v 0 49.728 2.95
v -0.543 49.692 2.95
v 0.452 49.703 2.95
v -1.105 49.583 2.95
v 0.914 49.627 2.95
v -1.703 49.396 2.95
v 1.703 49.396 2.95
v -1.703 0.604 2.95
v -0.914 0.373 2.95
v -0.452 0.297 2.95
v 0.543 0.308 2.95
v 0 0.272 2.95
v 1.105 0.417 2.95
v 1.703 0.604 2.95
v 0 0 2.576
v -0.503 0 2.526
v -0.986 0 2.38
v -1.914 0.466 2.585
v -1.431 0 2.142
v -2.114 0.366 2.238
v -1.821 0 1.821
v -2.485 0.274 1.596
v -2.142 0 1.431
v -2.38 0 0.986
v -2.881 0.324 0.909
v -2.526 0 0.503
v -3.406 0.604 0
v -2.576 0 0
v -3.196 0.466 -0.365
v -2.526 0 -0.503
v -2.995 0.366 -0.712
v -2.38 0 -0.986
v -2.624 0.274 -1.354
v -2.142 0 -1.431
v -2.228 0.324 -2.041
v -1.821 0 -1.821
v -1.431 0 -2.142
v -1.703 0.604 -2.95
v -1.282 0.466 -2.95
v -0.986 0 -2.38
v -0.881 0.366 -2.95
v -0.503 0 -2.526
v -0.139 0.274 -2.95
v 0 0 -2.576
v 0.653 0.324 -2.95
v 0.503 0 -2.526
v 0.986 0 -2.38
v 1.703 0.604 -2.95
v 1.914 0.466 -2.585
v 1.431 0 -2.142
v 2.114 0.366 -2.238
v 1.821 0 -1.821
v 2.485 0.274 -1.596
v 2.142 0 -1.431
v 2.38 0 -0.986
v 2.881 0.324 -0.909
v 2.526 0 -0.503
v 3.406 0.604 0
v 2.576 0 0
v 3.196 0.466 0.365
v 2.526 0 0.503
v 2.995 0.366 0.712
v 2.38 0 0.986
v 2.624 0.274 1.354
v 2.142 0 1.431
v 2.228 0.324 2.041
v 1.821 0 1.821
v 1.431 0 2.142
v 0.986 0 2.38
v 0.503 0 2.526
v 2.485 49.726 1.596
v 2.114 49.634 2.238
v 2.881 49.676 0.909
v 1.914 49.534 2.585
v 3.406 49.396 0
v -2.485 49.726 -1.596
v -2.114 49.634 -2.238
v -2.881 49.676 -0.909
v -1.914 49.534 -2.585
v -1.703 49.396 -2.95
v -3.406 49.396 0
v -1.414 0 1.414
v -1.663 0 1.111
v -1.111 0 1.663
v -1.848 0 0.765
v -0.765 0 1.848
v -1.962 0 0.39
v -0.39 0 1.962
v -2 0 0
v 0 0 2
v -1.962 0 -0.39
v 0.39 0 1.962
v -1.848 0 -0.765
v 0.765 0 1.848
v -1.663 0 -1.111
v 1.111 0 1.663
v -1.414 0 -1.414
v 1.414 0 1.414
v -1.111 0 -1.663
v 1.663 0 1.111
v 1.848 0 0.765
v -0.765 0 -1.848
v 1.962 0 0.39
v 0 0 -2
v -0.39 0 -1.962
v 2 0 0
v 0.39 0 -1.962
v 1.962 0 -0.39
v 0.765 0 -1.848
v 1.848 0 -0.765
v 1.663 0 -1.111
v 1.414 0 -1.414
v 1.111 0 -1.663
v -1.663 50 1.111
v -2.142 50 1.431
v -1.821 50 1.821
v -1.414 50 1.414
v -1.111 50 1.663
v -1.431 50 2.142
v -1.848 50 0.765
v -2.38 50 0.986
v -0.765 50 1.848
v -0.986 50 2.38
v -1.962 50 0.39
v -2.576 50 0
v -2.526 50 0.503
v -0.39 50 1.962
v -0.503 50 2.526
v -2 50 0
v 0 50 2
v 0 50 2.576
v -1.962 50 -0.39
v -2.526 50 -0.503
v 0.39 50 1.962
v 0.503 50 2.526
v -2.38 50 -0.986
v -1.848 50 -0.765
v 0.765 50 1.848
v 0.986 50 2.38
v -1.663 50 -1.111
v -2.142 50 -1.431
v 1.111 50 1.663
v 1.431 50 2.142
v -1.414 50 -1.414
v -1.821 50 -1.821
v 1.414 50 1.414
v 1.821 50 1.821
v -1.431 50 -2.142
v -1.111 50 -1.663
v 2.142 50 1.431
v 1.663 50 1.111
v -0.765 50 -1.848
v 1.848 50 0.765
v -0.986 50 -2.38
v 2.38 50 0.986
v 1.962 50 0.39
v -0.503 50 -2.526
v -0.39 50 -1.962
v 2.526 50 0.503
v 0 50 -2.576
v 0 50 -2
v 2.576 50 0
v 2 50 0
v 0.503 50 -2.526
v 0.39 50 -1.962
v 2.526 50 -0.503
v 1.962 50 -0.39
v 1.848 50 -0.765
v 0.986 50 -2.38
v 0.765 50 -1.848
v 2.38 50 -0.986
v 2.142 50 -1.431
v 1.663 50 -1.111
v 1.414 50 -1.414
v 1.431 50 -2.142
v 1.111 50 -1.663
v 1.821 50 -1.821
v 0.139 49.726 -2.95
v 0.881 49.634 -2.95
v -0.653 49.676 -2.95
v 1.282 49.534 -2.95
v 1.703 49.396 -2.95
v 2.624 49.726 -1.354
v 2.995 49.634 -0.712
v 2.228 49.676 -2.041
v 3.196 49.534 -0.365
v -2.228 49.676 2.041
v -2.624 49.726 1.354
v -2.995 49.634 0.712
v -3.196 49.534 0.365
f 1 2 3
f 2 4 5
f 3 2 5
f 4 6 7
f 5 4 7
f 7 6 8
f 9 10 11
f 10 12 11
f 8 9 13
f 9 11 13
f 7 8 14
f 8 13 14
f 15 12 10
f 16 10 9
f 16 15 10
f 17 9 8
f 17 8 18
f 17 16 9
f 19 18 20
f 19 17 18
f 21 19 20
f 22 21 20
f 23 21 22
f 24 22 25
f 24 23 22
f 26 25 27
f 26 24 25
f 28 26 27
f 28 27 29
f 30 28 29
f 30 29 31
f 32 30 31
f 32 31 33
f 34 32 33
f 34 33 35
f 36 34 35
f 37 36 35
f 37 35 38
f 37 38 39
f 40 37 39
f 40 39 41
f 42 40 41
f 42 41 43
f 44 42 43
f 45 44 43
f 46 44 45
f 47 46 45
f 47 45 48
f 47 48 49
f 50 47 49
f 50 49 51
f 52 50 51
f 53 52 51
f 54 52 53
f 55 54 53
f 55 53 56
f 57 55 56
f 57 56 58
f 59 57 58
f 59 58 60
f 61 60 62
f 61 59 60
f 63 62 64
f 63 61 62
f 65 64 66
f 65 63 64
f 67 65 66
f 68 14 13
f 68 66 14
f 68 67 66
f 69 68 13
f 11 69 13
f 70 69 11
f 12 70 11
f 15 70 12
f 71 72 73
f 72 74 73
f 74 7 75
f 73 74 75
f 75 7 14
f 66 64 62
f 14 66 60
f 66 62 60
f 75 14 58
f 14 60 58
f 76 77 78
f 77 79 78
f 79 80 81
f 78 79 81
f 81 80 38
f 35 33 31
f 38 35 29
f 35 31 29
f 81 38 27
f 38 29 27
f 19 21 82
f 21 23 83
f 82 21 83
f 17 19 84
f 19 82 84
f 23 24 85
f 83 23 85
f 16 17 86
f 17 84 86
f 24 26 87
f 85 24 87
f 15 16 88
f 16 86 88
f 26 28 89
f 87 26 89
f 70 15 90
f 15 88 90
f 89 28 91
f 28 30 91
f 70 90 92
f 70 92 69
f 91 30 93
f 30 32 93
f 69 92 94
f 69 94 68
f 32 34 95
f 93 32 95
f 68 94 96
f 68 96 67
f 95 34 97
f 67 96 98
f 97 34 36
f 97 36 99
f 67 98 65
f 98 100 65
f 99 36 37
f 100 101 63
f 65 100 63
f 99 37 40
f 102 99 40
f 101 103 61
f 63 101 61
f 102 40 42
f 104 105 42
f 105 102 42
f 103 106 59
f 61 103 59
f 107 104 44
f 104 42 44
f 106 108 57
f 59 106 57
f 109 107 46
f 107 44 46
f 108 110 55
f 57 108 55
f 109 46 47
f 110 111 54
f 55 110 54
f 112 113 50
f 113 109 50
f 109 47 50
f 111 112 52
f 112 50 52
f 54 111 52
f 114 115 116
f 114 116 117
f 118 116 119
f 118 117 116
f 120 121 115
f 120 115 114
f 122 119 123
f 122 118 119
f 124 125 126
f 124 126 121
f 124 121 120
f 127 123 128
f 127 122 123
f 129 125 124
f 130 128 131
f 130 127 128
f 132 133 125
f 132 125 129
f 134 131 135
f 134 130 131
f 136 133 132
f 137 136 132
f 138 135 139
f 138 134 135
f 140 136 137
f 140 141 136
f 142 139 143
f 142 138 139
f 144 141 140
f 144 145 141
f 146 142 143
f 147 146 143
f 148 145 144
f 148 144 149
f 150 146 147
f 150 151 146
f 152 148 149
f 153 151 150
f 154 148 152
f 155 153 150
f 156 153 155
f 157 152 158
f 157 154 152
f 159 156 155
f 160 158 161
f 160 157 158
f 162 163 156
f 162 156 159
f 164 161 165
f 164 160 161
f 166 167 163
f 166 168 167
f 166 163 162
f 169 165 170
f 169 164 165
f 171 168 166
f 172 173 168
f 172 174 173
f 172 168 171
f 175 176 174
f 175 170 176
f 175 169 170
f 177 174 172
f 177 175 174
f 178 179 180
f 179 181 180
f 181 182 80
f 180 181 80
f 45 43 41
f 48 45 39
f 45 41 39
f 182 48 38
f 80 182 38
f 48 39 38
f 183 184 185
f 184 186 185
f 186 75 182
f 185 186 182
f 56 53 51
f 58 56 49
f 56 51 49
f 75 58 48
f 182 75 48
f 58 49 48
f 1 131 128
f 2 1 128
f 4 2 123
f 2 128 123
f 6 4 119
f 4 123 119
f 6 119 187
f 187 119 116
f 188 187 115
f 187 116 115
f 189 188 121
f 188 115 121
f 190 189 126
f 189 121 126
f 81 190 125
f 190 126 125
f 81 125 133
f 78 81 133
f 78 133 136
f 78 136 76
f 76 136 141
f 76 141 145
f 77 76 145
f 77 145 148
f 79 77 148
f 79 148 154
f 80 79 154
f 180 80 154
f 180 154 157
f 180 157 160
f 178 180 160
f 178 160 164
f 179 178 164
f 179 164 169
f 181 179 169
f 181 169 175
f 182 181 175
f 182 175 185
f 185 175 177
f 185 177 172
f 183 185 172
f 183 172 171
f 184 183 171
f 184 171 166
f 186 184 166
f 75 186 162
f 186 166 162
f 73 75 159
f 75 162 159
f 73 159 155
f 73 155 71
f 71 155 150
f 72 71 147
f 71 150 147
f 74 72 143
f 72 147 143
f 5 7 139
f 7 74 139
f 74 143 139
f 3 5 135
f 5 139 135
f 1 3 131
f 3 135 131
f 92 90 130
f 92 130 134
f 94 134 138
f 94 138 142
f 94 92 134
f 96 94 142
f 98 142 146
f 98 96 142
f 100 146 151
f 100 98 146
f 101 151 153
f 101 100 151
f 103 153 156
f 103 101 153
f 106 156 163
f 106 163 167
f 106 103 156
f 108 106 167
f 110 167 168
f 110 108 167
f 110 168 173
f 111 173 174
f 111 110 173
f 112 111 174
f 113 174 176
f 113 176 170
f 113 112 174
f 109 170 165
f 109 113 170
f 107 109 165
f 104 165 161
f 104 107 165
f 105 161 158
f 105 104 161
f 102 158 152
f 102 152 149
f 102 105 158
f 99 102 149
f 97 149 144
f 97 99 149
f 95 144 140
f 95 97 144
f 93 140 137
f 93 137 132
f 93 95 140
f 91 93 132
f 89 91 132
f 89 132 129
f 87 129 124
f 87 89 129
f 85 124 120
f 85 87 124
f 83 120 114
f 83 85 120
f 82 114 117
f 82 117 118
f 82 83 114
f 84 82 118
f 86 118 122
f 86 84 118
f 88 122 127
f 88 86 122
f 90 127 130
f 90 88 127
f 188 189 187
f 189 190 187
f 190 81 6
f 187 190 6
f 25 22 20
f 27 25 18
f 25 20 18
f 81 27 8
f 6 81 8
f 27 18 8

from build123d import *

# Parameters (mm, degrees)
SKETCH_1_R      = 2
EXTRUDE_1_DEPTH = 50


with BuildPart() as part:
    # 草图1 → 凸台-拉伸1 (new body)
    with BuildSketch(Plane(origin=(0, 0, 0), x_dir=(1, 0, 0), z_dir=(0, 1, 0))):
        Polygon((1.703183294, -2.95), (3.406366588, 0), (1.703183294, 2.95), (-1.703183294, 2.95), (-3.406366588, 0), (-1.703183294, -2.95), align=None)
        with Locations(Location((0, 0, 0), (0, 0, 270))):
            Circle(SKETCH_1_R, mode=Mode.SUBTRACT)
    extrude(amount=EXTRUDE_1_DEPTH)

    # 草图3 → 切除-旋转1 (revolve, cut)
    with BuildSketch(Plane.XY, mode=Mode.PRIVATE) as cut_revolve_1_sk:
        Polygon((6.978635767, 3.2), (1.2, -1), (6.978635767, -1), align=None)
    cut_revolve_1 = revolve(cut_revolve_1_sk.sketch.rotate(Axis((0, 59.182101856, 0), (0, -1, 0)), 90), axis=Axis((0, 59.182101856, 0), (0, -1, 0)), mode=Mode.SUBTRACT)

    # 镜向1: 切除-旋转1 across plane
    add(cut_revolve_1.mirror(Plane.ZX.offset(25)), mode=Mode.SUBTRACT)


solid = part.part
